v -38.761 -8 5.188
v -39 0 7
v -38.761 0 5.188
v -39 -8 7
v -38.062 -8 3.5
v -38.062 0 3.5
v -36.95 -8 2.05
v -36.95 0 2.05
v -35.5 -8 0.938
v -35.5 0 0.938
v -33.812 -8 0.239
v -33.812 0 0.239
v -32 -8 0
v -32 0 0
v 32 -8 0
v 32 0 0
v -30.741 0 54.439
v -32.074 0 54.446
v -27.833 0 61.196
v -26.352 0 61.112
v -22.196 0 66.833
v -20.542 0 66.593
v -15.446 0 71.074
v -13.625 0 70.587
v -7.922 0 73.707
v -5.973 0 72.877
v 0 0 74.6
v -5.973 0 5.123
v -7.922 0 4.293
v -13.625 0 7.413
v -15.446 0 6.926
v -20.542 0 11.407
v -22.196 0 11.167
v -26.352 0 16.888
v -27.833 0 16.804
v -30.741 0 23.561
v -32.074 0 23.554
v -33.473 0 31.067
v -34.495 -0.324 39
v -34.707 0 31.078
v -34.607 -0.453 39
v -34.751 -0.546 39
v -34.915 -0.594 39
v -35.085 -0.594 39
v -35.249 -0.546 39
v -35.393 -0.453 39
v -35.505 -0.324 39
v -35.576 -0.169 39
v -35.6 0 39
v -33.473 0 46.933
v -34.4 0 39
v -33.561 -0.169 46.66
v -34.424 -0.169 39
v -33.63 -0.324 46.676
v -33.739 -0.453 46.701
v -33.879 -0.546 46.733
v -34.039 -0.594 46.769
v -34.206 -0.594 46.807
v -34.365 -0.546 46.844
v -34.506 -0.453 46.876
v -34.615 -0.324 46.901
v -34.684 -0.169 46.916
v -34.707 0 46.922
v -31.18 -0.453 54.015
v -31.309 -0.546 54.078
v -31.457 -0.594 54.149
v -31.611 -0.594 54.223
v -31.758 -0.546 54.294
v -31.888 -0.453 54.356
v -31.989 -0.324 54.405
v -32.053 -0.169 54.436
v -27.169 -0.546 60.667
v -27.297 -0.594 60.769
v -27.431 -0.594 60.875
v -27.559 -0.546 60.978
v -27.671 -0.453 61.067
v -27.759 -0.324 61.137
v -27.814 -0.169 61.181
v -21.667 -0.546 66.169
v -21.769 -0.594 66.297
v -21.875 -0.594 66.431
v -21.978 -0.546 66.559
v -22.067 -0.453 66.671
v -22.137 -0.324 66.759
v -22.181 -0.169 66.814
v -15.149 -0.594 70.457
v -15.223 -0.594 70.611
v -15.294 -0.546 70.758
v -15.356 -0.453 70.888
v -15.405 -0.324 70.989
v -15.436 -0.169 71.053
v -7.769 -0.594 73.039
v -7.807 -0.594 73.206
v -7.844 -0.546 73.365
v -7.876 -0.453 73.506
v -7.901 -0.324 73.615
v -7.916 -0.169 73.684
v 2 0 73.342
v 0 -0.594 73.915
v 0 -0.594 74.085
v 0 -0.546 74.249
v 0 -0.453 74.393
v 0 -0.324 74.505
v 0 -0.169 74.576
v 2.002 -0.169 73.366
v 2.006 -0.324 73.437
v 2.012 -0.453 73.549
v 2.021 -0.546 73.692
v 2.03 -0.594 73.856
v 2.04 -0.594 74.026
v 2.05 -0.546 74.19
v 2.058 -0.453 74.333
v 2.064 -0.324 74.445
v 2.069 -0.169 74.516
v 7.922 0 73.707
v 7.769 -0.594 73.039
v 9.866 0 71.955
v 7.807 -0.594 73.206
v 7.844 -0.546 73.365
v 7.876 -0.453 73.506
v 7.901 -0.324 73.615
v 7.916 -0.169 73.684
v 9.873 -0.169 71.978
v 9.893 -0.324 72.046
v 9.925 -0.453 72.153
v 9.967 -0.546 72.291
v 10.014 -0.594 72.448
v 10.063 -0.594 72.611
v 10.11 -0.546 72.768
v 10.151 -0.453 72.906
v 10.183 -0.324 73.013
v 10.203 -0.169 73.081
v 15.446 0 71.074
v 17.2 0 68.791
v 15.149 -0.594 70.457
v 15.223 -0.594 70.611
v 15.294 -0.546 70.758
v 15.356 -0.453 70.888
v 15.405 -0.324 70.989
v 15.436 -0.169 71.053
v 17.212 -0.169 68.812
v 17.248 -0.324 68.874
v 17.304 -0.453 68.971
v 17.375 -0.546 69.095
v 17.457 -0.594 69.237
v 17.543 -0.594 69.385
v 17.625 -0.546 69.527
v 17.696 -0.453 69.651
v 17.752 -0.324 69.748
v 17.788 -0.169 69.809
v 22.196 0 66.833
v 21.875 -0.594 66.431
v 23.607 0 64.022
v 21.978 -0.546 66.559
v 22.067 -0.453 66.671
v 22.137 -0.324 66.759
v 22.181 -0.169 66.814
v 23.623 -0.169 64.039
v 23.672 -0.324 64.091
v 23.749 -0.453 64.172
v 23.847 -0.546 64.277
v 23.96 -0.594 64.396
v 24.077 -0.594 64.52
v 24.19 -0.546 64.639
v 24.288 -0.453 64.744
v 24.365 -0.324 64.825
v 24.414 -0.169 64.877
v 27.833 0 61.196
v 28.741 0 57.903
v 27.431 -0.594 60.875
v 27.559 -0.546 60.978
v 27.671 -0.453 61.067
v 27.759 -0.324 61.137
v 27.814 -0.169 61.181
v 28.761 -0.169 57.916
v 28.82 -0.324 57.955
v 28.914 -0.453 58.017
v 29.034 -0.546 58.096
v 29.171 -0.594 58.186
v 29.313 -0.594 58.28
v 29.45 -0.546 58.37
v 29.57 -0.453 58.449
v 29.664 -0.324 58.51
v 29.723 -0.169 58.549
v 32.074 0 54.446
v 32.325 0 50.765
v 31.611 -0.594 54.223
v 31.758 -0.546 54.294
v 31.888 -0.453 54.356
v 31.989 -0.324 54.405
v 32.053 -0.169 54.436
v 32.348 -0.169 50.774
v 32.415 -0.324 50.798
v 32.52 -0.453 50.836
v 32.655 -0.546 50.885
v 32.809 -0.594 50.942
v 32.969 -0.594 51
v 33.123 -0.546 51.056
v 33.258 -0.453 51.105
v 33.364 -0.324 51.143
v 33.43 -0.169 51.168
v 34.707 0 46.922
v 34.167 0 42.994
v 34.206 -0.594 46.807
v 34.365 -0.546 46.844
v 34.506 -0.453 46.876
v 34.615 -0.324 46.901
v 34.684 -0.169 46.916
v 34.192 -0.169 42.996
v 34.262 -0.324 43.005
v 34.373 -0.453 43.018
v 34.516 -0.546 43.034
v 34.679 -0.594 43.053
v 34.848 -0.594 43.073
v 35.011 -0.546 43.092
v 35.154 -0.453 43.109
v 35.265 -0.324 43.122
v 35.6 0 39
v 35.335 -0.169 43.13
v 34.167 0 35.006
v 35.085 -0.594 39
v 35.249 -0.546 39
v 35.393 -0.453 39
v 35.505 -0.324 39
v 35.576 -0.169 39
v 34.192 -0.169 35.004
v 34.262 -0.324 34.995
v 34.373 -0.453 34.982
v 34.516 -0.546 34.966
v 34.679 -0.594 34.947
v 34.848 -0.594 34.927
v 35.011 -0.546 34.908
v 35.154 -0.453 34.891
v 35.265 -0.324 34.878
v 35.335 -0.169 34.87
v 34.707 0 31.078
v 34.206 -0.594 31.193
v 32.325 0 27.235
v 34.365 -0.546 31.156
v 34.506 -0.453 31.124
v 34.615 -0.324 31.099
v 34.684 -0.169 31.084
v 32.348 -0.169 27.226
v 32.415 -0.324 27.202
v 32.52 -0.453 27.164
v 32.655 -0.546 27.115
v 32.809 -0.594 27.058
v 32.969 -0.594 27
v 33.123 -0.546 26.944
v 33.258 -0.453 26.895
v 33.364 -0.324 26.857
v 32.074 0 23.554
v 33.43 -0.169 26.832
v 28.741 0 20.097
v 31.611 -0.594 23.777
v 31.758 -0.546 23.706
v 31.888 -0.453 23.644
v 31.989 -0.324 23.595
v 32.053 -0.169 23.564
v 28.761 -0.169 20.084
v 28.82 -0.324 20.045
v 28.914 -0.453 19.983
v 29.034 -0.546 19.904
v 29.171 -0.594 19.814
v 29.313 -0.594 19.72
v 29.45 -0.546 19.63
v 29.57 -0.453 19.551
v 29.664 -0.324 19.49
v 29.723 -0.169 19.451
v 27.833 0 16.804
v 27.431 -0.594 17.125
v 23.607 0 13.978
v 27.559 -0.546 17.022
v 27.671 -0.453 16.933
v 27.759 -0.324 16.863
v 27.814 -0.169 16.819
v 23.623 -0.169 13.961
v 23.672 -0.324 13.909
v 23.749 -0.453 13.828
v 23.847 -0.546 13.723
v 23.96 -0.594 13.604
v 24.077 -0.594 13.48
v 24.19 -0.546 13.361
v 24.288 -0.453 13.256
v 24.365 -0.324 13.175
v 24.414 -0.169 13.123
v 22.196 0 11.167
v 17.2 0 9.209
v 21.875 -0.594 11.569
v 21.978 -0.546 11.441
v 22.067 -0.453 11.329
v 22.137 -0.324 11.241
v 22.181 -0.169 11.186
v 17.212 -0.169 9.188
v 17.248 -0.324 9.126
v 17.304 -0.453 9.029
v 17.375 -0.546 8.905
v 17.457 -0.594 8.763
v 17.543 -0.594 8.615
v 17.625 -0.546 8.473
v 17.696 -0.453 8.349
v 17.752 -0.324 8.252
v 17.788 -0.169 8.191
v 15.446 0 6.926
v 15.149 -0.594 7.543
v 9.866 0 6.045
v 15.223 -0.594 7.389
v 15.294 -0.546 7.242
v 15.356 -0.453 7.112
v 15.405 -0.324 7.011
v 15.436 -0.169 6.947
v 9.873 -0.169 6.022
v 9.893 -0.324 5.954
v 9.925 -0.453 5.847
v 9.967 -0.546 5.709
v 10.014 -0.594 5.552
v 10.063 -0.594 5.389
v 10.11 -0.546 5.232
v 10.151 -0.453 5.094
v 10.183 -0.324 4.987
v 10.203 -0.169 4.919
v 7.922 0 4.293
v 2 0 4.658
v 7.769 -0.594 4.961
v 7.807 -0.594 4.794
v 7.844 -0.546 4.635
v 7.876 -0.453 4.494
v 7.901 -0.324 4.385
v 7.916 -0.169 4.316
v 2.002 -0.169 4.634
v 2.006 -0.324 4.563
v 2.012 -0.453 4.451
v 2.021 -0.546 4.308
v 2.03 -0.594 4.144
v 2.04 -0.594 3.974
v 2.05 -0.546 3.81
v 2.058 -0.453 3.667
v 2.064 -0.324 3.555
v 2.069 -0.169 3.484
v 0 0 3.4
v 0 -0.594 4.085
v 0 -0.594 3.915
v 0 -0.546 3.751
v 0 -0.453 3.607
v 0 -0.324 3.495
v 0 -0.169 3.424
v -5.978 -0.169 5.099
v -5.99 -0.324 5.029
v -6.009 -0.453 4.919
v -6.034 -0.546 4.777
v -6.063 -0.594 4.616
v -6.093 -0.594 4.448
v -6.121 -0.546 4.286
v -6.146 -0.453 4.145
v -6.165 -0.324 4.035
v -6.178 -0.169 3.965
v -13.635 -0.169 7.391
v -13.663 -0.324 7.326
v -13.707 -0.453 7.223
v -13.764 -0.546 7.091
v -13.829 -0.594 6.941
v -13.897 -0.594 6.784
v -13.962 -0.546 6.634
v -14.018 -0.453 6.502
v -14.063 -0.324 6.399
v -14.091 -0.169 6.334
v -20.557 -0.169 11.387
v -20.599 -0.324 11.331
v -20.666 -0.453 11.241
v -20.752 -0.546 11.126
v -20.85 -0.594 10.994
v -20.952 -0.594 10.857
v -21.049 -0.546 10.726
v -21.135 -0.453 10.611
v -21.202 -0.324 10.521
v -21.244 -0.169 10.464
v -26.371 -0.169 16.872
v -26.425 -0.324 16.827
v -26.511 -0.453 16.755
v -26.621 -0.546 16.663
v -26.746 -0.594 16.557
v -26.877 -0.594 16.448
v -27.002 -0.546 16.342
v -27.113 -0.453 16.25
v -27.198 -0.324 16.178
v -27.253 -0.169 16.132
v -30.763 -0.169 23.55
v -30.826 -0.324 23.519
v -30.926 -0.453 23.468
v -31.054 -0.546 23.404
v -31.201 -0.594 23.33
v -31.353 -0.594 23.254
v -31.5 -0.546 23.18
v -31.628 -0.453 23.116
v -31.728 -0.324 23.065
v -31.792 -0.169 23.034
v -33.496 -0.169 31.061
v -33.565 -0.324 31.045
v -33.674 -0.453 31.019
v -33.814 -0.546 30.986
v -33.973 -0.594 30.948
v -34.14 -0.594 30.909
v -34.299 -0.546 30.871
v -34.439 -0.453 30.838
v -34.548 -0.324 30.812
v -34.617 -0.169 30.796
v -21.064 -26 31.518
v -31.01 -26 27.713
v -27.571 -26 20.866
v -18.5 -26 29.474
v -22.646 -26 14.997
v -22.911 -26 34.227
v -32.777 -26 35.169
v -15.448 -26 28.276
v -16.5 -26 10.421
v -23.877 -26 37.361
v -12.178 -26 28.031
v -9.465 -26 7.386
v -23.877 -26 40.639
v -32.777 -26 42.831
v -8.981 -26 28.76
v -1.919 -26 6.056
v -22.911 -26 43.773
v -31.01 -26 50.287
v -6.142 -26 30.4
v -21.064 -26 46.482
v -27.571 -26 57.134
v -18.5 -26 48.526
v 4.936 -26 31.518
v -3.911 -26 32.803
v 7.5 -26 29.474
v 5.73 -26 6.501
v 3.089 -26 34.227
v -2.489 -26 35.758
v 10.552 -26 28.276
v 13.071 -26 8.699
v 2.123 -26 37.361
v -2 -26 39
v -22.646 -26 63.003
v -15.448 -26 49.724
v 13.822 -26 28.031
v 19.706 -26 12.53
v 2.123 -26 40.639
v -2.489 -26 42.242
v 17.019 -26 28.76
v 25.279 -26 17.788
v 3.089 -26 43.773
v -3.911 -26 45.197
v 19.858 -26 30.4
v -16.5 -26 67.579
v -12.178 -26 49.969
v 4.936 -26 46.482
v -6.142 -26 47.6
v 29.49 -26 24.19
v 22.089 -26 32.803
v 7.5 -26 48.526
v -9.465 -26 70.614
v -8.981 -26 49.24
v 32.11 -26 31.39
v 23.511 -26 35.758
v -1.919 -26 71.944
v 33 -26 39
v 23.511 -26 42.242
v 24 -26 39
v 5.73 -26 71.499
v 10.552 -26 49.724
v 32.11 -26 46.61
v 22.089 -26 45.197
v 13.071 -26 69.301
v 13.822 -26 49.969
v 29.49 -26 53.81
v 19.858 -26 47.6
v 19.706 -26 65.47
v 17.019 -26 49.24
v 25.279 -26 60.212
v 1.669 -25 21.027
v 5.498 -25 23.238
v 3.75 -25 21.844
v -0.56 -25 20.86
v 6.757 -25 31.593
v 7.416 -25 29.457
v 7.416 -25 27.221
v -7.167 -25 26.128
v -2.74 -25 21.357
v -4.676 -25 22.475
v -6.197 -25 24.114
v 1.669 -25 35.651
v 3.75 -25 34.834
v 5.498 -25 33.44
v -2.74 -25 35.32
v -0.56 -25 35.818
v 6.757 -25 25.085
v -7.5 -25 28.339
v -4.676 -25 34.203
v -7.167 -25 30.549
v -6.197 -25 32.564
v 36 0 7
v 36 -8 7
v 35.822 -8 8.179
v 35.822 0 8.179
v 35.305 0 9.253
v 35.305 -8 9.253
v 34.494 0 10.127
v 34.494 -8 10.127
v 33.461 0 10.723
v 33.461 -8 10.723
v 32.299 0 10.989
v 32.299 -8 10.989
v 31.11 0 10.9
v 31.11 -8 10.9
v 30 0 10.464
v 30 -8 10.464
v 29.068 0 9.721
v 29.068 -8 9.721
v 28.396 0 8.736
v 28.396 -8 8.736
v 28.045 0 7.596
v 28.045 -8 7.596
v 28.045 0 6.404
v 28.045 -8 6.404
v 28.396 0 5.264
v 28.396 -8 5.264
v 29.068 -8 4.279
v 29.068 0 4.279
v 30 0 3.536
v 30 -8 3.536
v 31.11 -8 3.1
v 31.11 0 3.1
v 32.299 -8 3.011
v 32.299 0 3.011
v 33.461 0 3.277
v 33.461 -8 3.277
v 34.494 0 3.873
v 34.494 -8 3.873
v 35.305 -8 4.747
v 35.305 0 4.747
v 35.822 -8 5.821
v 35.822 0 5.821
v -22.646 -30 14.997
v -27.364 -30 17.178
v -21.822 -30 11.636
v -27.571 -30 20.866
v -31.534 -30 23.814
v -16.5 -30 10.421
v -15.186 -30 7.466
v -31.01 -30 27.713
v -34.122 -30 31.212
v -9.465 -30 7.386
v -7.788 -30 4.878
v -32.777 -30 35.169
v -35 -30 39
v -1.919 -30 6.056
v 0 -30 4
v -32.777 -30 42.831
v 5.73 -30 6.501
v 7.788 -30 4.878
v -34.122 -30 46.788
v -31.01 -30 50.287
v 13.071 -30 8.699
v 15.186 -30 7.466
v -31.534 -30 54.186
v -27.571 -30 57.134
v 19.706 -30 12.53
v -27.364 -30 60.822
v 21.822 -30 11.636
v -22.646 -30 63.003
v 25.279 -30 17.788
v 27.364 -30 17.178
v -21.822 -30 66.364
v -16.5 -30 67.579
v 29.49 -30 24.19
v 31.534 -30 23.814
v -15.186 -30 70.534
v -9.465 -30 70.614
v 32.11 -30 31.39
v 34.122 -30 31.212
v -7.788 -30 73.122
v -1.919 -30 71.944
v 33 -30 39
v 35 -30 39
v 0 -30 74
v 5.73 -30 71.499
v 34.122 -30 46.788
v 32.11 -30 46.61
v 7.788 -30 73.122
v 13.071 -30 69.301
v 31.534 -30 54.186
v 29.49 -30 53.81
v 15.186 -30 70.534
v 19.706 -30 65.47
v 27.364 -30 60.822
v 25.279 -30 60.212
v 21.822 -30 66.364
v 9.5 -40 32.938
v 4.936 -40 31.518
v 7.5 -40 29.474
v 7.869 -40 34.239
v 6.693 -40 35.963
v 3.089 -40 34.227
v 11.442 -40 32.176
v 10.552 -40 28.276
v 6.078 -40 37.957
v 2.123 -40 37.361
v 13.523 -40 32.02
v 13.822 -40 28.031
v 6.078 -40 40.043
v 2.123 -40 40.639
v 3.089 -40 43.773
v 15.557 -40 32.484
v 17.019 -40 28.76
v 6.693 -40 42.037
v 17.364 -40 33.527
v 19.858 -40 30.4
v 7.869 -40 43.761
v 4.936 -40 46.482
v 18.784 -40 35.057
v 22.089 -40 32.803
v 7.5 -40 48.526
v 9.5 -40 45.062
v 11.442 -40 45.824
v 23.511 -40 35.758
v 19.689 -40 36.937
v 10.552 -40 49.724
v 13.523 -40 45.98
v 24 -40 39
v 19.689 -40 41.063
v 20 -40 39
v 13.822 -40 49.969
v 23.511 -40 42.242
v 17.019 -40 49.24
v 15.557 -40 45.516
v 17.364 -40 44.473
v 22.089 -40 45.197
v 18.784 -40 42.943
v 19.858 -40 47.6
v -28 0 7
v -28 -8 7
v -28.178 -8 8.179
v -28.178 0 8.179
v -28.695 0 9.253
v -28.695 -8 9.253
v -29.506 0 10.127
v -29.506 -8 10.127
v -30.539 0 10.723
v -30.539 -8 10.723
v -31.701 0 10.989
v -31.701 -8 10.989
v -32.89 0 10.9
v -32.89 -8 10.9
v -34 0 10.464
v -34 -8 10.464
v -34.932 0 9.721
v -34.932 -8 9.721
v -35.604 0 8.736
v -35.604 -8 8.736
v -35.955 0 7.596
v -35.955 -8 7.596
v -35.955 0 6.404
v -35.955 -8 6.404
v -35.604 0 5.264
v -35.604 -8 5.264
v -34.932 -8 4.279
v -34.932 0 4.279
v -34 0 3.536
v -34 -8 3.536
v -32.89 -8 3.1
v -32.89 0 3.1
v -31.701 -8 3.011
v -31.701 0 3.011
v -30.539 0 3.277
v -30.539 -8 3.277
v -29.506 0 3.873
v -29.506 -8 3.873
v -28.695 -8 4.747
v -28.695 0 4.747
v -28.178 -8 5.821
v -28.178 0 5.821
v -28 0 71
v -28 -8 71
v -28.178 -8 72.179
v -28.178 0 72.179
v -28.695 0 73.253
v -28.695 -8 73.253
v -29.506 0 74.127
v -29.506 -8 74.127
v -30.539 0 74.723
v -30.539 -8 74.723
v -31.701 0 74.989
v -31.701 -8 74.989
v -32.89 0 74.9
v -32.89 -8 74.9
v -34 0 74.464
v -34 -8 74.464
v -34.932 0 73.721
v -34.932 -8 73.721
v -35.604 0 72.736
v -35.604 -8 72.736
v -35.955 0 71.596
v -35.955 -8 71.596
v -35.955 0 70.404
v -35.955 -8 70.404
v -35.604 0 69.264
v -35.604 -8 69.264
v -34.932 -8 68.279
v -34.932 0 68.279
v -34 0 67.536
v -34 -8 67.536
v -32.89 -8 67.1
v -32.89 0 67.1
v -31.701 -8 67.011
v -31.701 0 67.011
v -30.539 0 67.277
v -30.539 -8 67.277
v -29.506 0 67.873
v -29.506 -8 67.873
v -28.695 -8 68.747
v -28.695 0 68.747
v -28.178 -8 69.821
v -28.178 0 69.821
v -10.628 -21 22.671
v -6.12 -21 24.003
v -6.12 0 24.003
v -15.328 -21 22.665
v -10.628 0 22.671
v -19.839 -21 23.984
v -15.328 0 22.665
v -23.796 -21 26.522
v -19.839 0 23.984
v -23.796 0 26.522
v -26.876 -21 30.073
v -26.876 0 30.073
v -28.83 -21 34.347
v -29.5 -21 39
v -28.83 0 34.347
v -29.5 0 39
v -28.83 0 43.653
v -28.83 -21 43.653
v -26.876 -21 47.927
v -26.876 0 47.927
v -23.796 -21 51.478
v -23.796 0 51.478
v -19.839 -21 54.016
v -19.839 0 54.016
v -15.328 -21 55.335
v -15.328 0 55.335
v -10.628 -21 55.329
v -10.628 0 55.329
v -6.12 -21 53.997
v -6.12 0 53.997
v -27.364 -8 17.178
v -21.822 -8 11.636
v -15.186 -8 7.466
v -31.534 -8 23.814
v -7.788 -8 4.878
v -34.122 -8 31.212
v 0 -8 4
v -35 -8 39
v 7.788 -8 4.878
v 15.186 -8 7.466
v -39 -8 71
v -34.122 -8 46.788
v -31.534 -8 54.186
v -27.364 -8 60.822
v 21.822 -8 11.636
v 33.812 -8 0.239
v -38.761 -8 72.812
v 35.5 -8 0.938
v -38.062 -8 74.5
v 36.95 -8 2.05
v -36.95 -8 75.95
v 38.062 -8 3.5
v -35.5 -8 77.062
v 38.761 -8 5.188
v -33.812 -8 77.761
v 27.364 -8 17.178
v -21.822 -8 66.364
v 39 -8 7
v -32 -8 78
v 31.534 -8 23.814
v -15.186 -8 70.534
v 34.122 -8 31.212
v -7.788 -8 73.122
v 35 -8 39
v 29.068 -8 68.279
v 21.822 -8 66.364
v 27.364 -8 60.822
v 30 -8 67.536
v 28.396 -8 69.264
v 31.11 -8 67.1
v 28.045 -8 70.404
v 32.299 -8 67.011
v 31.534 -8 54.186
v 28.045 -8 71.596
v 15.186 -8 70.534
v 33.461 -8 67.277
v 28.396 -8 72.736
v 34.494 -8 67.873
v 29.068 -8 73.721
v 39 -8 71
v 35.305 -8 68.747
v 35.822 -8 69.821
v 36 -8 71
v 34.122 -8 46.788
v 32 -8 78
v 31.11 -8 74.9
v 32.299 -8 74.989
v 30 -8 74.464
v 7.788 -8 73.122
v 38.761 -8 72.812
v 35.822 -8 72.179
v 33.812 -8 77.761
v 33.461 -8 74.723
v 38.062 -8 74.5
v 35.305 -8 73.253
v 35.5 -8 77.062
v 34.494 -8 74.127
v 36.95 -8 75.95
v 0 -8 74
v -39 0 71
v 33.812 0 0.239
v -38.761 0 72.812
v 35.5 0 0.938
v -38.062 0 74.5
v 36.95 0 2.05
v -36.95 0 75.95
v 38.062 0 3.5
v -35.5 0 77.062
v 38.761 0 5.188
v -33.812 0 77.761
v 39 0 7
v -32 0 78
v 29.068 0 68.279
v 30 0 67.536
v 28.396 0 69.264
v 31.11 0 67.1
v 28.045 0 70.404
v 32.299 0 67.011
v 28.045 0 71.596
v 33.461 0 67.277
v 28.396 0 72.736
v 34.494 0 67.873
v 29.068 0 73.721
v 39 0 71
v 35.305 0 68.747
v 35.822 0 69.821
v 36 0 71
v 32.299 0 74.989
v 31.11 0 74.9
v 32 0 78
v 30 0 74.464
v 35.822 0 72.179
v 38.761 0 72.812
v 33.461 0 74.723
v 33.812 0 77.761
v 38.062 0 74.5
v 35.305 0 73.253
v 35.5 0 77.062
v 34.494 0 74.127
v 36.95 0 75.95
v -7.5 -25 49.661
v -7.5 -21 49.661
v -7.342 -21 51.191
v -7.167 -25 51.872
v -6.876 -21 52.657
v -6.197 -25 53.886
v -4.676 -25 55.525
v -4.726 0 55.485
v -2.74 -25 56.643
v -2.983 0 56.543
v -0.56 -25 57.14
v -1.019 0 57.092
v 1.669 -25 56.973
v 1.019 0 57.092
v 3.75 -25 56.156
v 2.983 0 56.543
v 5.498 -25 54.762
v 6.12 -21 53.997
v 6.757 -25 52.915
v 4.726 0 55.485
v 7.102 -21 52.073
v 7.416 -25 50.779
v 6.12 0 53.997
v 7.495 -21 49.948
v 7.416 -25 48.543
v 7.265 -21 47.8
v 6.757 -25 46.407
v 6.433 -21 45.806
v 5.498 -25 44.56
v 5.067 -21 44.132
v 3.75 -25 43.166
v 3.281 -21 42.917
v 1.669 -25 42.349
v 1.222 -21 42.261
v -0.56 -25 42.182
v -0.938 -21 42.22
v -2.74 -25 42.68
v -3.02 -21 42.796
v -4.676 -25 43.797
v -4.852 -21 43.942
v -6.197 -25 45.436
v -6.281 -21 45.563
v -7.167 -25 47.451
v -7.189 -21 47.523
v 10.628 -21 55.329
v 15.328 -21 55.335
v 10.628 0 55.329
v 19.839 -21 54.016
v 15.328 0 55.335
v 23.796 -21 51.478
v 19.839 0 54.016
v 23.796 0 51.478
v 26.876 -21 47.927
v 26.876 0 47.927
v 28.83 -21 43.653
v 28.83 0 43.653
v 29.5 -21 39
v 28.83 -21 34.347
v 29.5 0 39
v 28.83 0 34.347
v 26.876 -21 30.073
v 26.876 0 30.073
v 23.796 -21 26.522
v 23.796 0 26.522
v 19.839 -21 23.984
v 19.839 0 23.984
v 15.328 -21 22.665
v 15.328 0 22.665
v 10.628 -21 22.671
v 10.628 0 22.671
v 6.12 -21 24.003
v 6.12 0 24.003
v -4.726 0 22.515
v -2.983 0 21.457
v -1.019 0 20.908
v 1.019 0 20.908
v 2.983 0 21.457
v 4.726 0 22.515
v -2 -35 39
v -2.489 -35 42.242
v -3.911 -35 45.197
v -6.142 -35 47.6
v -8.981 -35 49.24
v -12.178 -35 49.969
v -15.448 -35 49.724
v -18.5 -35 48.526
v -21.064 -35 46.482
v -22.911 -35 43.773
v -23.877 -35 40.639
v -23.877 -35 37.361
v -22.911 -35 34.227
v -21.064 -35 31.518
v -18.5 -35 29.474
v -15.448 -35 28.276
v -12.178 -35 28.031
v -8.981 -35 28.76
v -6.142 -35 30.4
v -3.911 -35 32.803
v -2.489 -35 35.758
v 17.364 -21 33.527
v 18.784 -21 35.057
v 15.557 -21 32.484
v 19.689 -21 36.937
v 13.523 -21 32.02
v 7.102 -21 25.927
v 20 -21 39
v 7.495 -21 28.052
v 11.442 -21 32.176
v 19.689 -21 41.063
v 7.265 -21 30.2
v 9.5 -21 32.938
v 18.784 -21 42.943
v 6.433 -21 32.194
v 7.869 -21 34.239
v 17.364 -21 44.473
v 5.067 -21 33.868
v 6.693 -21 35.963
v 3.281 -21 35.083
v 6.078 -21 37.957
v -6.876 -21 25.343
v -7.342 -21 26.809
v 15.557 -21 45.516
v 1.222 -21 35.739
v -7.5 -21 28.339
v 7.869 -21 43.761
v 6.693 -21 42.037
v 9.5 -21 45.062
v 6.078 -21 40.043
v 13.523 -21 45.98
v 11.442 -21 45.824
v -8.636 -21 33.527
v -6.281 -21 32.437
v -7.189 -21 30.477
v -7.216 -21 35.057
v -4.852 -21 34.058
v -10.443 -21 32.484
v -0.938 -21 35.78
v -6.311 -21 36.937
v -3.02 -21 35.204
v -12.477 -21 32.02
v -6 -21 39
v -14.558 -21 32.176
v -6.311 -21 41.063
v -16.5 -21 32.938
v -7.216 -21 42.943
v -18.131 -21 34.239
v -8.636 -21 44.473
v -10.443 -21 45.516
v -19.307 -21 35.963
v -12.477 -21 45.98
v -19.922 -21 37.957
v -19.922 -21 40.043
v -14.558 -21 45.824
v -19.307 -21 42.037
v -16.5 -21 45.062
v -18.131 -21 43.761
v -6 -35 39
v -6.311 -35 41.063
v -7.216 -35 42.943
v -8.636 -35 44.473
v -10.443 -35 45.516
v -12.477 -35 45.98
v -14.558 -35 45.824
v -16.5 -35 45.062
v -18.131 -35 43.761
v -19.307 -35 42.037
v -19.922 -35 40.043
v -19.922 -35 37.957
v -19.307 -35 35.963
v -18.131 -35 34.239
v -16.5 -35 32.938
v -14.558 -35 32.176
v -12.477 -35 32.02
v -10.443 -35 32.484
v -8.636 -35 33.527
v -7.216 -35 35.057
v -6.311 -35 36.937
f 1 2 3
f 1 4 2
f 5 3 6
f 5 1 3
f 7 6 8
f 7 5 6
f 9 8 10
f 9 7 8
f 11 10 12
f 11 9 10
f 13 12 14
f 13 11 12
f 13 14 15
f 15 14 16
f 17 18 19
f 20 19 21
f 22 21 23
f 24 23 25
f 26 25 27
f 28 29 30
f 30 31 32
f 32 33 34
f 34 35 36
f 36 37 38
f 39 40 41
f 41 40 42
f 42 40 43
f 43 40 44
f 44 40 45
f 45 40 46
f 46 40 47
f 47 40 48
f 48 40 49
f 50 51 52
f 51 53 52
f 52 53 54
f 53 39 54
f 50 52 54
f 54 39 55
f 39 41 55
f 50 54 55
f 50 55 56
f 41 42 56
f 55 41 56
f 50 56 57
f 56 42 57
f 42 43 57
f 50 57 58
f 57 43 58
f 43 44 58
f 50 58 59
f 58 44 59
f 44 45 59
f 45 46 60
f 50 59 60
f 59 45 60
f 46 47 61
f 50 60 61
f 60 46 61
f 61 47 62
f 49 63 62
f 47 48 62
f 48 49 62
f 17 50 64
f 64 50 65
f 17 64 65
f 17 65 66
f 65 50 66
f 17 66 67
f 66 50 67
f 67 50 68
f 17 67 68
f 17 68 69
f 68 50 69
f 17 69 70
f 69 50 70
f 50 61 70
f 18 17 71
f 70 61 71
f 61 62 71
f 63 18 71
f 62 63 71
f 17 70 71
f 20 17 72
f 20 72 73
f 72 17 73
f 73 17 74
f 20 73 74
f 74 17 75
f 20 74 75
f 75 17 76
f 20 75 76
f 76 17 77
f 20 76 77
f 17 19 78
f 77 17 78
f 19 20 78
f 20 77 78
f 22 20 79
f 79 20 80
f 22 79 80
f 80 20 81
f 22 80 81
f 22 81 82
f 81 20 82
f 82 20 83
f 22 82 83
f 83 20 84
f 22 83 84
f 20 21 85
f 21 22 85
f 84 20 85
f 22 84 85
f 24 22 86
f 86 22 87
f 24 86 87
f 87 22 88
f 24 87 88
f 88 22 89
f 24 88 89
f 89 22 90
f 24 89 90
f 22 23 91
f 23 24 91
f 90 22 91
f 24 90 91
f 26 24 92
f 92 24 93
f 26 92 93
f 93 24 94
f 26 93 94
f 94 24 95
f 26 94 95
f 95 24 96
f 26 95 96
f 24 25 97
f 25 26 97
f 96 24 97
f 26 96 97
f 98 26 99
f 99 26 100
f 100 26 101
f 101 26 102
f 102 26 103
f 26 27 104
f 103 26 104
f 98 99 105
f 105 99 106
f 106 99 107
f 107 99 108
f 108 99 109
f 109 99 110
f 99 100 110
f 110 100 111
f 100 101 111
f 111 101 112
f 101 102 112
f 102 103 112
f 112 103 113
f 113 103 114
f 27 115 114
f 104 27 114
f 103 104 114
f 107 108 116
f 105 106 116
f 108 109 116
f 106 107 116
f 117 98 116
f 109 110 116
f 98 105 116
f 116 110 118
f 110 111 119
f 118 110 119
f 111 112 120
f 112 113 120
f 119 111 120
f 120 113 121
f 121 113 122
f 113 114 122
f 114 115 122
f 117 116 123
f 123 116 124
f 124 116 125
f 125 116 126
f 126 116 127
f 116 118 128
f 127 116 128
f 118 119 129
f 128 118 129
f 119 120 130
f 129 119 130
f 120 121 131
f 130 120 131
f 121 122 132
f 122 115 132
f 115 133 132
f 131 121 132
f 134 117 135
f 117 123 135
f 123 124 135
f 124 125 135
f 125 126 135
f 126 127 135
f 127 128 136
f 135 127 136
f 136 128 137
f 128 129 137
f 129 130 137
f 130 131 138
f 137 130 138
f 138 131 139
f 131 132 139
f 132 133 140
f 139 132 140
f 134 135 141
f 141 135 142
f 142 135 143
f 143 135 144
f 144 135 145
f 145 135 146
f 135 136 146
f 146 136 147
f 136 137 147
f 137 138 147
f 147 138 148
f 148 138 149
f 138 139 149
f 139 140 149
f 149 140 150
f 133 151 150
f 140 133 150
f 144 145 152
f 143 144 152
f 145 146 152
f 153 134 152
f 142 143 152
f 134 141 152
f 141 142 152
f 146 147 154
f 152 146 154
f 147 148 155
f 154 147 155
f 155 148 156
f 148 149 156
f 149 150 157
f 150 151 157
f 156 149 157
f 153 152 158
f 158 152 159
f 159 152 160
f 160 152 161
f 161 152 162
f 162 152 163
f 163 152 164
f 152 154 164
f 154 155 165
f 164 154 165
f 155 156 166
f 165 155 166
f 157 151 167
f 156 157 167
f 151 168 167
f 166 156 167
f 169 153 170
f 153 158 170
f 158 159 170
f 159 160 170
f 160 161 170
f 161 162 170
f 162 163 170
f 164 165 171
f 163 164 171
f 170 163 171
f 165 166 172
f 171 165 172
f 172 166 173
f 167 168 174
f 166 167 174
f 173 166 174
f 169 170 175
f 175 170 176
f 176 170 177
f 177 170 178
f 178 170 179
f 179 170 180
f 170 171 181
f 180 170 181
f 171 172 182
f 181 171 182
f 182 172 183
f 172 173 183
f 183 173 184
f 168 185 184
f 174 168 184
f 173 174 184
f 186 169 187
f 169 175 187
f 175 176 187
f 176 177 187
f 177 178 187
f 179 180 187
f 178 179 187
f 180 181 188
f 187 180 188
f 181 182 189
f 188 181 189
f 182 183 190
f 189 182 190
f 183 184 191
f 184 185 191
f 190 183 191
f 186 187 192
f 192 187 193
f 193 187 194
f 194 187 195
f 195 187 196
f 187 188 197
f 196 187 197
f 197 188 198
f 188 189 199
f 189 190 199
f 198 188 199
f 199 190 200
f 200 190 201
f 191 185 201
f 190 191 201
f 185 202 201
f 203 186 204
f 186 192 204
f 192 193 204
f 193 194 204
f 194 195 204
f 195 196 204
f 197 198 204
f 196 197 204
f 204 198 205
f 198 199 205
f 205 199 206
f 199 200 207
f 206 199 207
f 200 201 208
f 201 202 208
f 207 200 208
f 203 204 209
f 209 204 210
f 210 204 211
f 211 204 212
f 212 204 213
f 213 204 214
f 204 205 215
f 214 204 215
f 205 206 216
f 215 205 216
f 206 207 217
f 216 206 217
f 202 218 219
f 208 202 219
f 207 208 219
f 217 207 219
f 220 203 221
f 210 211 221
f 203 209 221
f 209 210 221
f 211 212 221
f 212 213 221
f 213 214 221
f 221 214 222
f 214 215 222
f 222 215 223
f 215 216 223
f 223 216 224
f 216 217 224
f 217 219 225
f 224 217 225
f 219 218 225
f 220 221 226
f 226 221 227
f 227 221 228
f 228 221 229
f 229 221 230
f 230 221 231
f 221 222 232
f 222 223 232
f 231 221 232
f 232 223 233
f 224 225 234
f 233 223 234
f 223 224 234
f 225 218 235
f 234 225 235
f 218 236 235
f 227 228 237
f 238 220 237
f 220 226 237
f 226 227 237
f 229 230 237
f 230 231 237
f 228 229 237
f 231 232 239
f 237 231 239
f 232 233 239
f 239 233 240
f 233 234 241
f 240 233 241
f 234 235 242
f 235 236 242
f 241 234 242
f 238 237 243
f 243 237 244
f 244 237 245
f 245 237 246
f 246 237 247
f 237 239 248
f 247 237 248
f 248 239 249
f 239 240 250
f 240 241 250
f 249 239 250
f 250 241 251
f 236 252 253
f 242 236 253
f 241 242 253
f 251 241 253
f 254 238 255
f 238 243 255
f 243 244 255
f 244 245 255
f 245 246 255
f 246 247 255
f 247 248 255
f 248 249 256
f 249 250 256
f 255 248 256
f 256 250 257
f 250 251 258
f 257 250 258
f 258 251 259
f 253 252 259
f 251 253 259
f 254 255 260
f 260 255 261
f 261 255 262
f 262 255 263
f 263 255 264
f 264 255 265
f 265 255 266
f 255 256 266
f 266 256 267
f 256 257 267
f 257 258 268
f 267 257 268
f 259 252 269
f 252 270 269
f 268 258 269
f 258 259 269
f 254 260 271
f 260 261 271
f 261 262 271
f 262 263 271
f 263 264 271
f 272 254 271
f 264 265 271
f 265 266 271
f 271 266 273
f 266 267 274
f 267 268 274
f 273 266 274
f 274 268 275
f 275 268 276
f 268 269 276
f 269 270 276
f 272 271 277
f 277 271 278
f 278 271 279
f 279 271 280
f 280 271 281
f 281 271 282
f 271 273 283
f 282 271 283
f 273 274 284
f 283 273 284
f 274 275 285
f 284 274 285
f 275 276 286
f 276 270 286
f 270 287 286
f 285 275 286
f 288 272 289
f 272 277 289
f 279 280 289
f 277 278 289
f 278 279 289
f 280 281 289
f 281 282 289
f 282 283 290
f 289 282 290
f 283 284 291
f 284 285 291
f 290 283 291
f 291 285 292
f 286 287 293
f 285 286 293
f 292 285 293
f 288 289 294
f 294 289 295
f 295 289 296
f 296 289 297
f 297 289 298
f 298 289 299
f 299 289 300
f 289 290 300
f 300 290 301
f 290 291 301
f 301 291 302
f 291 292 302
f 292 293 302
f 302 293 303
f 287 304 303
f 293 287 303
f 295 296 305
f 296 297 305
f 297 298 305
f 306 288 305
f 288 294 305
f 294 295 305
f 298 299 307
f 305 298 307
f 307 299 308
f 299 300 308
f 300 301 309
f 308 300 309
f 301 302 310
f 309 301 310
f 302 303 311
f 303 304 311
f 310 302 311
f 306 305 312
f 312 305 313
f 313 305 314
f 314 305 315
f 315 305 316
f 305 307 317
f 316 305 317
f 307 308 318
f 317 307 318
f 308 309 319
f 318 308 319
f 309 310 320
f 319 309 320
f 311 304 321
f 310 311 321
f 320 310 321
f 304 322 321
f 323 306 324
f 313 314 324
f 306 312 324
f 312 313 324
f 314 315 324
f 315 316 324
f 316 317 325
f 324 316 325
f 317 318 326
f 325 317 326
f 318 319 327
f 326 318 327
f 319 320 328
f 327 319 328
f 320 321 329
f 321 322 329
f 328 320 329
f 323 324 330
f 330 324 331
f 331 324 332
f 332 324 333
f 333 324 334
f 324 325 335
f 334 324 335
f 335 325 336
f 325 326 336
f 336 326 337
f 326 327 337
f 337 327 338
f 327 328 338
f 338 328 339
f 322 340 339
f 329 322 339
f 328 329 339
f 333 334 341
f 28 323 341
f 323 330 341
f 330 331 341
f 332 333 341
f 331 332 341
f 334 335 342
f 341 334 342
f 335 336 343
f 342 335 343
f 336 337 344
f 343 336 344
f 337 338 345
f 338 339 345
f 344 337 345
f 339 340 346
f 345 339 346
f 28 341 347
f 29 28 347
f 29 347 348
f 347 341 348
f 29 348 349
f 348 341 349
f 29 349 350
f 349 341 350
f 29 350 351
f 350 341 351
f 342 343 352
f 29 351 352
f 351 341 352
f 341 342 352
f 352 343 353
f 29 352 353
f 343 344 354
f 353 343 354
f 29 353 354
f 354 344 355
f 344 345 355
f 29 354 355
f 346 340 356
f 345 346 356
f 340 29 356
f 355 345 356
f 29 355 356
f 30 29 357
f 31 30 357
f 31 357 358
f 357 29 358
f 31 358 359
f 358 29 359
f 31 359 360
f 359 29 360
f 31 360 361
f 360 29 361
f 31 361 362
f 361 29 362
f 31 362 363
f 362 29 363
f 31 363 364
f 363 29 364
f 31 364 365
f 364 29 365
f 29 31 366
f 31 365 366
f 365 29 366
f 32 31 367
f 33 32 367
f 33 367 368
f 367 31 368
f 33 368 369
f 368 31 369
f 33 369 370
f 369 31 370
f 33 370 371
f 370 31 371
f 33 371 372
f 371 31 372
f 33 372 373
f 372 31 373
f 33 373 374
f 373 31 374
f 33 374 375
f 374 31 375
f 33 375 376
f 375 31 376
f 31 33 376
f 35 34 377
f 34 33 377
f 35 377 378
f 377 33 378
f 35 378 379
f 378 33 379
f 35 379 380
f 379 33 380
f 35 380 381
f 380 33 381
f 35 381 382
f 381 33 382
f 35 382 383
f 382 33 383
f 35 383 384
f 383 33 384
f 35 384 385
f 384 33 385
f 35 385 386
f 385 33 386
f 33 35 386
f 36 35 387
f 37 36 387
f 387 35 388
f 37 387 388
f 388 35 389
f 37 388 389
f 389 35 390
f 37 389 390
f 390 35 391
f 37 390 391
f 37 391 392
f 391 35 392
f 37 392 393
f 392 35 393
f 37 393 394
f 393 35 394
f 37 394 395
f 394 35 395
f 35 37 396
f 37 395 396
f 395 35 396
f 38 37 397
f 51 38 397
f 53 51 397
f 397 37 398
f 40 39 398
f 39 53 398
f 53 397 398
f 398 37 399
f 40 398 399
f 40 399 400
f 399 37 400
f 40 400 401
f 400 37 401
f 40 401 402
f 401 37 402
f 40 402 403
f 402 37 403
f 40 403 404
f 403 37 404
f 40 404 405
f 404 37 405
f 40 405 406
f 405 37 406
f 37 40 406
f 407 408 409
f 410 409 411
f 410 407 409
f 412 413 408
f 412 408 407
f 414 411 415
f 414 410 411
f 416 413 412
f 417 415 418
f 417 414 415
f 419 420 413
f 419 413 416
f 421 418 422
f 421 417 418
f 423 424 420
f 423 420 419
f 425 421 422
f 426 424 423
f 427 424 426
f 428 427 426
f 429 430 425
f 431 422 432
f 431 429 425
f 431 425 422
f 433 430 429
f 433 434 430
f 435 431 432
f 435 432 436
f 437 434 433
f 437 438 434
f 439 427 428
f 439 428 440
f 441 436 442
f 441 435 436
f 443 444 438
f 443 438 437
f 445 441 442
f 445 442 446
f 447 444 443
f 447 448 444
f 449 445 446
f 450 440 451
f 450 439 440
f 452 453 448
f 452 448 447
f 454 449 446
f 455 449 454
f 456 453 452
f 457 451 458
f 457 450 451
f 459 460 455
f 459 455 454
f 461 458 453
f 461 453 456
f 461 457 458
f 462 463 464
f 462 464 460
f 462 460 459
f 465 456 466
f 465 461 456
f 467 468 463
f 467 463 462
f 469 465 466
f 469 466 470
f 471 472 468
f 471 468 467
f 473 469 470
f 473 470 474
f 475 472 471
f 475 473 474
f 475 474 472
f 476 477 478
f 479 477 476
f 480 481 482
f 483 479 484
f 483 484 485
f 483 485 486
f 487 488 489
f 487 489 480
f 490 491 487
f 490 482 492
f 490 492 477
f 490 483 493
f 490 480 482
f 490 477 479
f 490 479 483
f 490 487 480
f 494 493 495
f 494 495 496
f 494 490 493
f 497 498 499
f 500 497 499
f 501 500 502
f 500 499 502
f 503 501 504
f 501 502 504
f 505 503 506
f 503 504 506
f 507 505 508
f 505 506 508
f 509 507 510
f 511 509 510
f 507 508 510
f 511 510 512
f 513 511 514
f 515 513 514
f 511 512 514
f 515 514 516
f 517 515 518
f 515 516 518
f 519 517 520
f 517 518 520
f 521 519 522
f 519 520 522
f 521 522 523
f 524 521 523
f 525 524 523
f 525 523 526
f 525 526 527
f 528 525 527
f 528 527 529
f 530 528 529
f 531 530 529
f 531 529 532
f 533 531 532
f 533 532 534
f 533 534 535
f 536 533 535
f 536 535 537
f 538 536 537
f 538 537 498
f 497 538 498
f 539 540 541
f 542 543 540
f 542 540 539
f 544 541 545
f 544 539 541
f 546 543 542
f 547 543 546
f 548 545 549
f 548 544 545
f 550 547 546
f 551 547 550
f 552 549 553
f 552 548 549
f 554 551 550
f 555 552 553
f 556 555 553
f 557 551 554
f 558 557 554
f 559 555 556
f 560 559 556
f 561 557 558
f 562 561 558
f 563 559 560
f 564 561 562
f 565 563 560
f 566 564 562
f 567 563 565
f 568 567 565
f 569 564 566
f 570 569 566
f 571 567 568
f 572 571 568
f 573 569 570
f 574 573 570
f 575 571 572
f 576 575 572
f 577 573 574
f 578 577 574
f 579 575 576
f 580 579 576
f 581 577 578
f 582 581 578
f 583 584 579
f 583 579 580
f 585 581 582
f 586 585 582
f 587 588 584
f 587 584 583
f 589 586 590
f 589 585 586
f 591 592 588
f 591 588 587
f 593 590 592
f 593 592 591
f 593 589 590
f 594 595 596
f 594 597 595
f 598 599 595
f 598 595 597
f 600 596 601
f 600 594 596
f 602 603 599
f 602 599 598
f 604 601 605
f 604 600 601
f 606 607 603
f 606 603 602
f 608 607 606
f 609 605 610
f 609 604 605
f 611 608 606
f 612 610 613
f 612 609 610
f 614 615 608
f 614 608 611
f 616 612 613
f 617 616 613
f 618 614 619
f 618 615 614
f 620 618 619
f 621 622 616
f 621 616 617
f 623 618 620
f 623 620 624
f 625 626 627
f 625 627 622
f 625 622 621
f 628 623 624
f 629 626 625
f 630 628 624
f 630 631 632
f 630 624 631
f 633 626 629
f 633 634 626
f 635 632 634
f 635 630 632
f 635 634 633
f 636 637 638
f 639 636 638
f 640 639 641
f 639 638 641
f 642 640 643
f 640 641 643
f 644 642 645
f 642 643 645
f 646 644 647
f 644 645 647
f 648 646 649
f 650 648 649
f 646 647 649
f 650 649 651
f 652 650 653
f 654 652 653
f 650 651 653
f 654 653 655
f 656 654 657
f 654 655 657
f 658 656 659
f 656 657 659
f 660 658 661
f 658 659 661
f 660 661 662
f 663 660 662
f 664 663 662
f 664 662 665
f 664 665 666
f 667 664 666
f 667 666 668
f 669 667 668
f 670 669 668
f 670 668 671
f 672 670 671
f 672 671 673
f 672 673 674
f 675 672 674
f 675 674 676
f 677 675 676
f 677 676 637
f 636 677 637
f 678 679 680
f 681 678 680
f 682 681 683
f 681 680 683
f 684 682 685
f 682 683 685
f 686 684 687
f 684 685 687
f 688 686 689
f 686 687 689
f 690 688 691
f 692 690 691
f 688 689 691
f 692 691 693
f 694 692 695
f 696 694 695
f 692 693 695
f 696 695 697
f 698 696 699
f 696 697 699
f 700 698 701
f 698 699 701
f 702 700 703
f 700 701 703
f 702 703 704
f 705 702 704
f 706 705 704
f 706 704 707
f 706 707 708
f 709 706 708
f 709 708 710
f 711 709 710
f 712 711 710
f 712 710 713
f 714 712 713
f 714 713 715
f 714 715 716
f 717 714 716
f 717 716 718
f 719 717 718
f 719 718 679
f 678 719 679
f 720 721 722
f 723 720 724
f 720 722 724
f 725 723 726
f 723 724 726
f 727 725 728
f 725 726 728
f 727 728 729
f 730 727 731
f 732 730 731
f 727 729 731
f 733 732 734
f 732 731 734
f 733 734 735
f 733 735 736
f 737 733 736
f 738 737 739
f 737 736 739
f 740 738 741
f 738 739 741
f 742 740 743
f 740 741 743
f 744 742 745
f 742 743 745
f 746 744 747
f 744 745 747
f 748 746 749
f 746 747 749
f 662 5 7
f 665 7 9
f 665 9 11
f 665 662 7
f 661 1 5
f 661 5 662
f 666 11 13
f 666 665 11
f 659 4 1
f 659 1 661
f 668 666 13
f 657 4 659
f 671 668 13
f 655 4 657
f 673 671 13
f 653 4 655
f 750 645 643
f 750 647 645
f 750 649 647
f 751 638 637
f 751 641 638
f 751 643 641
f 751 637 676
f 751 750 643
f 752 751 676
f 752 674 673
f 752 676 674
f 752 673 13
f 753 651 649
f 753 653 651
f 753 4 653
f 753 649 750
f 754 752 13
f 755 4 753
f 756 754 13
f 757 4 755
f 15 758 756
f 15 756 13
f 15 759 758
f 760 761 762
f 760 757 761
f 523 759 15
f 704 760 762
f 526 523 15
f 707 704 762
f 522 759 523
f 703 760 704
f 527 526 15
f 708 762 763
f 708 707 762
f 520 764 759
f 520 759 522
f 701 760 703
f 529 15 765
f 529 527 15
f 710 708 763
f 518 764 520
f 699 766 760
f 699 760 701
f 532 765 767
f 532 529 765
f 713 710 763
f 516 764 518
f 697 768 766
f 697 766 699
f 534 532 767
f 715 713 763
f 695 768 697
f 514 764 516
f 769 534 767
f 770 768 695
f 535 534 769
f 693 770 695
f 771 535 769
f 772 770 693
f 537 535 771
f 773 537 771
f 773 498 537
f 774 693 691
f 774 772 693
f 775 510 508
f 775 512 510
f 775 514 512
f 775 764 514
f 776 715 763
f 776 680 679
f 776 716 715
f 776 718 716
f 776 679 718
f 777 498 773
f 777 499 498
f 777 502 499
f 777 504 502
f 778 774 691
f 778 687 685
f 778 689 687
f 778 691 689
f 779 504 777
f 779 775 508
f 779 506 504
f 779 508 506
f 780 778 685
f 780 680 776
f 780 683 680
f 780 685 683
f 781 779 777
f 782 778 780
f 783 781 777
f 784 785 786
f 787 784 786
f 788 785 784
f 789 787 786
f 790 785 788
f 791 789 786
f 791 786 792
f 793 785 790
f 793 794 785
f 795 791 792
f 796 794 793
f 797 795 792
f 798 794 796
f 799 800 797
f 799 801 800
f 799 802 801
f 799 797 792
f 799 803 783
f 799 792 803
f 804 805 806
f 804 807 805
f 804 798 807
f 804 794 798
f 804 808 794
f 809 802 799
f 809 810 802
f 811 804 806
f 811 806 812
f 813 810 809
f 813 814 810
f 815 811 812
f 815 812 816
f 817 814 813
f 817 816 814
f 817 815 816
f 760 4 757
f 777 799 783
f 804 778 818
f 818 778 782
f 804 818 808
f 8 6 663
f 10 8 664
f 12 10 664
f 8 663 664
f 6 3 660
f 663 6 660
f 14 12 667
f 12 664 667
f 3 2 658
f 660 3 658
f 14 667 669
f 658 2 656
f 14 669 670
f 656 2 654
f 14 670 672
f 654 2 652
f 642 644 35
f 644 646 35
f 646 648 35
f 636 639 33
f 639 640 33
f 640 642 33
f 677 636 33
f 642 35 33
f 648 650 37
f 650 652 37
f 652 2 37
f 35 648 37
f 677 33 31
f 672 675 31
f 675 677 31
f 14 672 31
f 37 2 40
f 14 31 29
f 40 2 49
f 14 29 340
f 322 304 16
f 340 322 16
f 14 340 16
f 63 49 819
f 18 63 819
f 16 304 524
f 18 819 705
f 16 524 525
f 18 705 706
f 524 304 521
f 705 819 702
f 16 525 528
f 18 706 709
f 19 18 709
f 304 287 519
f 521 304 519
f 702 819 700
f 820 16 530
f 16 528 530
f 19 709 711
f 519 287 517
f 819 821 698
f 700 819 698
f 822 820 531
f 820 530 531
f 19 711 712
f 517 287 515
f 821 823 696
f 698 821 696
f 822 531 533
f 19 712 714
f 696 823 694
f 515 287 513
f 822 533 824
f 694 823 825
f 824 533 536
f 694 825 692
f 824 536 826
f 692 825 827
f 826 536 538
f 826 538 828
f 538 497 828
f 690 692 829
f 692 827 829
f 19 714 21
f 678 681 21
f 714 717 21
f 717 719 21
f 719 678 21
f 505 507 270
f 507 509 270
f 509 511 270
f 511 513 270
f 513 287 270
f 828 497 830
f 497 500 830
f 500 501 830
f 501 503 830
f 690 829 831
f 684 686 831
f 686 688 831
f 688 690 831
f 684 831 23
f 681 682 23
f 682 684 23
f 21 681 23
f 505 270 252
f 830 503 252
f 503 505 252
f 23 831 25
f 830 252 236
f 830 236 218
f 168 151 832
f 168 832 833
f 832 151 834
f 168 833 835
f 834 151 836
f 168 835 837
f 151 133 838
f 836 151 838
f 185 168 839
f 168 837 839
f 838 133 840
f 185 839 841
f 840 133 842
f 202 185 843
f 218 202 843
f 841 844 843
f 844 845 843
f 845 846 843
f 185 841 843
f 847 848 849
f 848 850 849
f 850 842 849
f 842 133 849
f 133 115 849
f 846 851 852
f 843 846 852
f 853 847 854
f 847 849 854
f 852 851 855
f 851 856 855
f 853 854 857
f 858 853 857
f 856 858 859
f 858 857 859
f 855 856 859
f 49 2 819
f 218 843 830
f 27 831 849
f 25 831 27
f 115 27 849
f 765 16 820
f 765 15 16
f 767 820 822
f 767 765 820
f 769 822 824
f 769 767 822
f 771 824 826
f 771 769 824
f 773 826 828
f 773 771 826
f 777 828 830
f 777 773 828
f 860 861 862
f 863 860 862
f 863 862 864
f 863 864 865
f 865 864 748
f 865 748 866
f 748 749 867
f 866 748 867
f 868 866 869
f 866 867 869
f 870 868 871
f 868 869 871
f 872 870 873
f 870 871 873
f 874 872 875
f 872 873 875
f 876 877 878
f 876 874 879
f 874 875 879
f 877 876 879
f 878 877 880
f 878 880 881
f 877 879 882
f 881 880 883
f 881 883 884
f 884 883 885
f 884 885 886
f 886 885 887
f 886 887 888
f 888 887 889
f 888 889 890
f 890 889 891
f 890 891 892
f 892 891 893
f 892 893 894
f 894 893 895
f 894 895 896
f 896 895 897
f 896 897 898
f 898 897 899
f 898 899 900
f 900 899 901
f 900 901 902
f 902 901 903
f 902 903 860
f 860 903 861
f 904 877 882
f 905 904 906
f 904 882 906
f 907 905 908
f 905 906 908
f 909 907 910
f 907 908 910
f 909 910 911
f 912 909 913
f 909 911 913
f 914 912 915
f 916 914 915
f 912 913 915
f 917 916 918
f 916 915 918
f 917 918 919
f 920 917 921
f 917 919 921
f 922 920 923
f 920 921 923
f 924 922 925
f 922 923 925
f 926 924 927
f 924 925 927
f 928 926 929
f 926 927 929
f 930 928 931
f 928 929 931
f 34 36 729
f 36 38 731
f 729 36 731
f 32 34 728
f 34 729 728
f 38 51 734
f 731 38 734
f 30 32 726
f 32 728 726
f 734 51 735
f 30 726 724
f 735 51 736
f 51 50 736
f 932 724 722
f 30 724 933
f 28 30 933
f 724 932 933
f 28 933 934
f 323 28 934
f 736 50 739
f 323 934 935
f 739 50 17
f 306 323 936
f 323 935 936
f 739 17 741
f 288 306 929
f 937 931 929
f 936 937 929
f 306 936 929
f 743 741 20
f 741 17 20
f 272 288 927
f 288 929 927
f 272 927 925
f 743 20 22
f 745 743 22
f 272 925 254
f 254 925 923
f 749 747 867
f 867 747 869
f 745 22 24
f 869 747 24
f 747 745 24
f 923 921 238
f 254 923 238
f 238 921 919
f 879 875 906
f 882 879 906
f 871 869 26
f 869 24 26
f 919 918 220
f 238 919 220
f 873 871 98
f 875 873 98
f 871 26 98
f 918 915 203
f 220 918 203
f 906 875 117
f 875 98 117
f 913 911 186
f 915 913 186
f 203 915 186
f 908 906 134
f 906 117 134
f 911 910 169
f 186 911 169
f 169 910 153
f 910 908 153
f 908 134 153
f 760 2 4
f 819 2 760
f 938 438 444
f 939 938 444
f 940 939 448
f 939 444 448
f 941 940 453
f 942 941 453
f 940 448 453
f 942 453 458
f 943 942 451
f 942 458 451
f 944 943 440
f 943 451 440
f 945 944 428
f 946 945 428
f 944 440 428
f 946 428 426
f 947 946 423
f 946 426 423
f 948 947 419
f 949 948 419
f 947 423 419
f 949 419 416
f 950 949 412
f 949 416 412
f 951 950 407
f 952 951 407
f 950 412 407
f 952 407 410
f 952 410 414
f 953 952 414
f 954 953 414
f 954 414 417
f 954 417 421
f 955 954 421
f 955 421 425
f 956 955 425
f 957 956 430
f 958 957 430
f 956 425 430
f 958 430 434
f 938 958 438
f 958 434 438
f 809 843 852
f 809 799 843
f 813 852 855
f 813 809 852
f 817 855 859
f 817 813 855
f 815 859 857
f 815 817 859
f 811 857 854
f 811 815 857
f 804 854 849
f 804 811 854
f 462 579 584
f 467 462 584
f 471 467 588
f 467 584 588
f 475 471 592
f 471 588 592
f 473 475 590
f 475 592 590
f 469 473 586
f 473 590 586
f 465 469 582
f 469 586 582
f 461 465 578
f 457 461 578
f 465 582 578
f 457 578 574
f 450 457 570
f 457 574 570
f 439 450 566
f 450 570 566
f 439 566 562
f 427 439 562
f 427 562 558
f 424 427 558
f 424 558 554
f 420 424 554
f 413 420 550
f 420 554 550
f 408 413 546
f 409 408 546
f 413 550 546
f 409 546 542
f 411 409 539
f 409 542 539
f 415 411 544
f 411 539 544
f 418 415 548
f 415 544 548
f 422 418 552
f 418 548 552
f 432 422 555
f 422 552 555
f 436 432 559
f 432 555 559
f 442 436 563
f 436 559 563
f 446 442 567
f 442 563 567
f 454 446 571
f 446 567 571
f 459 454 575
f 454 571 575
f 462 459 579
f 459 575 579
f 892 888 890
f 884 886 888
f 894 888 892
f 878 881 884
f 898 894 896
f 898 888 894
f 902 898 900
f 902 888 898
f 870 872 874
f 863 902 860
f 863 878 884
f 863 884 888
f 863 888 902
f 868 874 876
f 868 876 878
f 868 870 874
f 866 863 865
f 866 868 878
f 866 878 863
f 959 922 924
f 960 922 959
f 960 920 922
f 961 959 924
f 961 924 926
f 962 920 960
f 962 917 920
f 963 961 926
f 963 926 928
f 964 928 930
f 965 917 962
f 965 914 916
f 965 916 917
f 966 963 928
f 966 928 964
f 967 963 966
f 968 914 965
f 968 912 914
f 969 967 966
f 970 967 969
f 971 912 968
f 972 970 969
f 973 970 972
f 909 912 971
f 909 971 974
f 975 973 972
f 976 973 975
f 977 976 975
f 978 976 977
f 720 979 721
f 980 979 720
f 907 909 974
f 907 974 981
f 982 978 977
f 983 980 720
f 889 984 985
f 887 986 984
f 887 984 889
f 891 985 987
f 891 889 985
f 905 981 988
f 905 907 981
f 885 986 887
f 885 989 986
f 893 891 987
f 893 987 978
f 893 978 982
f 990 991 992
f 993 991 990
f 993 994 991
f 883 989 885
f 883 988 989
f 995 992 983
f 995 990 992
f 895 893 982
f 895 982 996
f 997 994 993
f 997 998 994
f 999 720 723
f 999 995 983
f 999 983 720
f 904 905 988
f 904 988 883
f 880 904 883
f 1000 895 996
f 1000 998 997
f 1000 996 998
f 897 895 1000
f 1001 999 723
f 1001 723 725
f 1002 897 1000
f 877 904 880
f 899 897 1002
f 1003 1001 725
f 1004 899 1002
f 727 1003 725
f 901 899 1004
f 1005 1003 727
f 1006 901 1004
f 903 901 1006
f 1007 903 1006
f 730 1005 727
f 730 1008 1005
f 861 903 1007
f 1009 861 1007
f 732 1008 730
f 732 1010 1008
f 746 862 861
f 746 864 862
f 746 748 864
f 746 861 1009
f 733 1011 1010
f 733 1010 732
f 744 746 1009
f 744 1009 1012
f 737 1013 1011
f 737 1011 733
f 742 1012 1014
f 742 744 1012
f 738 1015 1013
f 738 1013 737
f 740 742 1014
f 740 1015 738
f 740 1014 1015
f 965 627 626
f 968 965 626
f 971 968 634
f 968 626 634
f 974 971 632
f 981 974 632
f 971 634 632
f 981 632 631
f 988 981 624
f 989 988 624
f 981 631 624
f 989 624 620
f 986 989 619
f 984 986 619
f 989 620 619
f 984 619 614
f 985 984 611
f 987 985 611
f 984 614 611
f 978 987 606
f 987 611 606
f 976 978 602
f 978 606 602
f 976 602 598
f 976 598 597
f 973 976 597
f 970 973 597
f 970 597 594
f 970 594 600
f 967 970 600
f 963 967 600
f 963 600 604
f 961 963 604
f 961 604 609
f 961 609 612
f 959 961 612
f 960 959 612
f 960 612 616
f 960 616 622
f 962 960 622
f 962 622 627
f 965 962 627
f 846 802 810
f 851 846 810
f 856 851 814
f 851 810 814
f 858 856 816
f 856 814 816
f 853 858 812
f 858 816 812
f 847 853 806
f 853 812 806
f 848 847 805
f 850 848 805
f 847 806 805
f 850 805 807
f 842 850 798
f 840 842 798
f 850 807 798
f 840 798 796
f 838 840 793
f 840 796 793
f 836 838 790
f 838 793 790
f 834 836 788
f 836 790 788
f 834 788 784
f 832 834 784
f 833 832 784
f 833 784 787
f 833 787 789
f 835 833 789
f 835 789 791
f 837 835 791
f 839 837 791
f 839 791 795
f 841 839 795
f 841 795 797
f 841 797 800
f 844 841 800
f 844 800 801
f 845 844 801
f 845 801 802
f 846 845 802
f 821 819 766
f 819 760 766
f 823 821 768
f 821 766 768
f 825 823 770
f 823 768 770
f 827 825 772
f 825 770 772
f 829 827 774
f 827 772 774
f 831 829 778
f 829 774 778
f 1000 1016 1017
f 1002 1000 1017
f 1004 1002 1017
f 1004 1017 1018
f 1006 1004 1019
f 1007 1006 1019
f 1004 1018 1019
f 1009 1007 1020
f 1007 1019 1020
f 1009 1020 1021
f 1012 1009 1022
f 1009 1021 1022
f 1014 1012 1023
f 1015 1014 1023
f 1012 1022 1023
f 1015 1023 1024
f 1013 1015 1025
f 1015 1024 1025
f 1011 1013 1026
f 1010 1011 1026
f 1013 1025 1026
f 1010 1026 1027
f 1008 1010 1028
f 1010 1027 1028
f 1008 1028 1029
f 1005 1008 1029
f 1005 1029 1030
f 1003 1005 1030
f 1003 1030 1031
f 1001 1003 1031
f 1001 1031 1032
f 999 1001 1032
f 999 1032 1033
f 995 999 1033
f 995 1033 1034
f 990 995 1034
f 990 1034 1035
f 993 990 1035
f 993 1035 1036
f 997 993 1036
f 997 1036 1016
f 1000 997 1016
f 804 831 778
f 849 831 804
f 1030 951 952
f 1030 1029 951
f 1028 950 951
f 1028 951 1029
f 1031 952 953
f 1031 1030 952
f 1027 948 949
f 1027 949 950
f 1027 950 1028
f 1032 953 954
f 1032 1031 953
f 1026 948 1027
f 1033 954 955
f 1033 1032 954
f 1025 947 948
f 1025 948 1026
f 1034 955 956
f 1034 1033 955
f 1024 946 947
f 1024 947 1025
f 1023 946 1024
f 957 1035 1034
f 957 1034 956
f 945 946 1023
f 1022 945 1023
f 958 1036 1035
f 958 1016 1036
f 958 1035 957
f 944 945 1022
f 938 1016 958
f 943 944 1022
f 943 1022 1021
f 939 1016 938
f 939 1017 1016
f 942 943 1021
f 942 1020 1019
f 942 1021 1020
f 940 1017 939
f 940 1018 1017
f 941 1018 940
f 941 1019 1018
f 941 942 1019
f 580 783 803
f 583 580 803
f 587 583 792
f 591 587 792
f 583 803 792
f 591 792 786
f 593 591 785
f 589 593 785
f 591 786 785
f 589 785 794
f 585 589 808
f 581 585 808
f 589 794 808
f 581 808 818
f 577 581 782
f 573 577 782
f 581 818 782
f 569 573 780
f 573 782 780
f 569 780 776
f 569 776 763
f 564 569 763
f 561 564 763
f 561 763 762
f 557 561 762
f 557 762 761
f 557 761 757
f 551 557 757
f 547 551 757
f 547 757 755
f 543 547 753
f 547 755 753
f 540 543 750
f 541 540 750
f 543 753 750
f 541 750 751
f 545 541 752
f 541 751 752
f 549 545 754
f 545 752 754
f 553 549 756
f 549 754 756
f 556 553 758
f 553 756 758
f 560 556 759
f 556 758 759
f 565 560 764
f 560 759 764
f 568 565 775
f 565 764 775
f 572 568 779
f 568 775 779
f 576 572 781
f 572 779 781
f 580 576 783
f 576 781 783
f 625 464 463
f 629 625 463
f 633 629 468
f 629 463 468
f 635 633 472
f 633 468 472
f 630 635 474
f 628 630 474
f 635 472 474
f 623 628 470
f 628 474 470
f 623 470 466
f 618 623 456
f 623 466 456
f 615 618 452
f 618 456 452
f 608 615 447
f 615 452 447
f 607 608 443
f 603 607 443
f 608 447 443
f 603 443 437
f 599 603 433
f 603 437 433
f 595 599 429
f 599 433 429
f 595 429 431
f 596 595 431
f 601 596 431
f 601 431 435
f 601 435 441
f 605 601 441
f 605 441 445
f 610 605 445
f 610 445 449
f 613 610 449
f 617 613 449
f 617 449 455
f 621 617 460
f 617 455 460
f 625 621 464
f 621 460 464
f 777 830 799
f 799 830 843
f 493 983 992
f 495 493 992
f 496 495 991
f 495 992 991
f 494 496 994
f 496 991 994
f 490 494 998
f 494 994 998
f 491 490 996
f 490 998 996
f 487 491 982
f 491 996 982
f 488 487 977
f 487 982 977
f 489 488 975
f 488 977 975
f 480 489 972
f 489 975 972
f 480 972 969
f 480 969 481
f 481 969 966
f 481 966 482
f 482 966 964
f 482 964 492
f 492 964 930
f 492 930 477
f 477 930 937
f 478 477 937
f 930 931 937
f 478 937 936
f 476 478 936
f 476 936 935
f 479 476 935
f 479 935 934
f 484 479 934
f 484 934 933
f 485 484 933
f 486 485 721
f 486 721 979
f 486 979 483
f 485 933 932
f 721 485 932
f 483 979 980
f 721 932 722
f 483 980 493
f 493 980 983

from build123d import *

# Parameters (mm, degrees)
F0_W      = 78
F0_H      = 78
F1_DEPTH  = 8
F2_R      = 7
F3_R      = 4
F4_DEPTH  = 8.001
F5_R      = 35
F6_DEPTH  = 22
F7_R      = 33
F8_DEPTH  = 4
F10_R     = 0.6
F13_DEPTH = 21
F14_R     = 7.5
F15_DEPTH = 25
F16_R     = 11
F17_DEPTH = 14
F18_R     = 11
F19_DEPTH = 9
F20_R     = 7
F21_DEPTH = 35.001
F22_R     = 7
F23_DEPTH = 40.001


with BuildPart() as f1:
    # F0 (on Front) → F1 (new body)
    with BuildSketch(Plane.XZ):
        with Locations((0, 39)):
            Rectangle(F0_W, F0_H)
    extrude(amount=F1_DEPTH)

    # F2
    f2_edges = [f1.edges().sort_by_distance(p)[0] for p in [
        (-39, -4, 78),
        (39, -4, 78),
        (39, -4, 0),
        (-39, -4, 0),
    ]]
    fillet(f2_edges, radius=F2_R)

    # F3 (on face) → F4 (cut, through all)
    with BuildSketch(Plane.XZ.offset(8)):
        with Locations((-32, 71)):
            Circle(F3_R)
        with Locations((32, 71)):
            Circle(F3_R)
        with Locations((-32, 7)):
            Circle(F3_R)
        with Locations((32, 7)):
            Circle(F3_R)
    extrude(amount=-F4_DEPTH, mode=Mode.SUBTRACT)

    # F5 (on face) → F6 (join)
    with BuildSketch(Plane.XZ.offset(8)):
        with Locations((0, 39)):
            Circle(F5_R)
    extrude(amount=F6_DEPTH)

    # F7 (on face) → F8 (cut)
    with BuildSketch(Plane.XZ.offset(30)):
        with Locations((0, 39)):
            Circle(F7_R)
    extrude(amount=-F8_DEPTH, mode=Mode.SUBTRACT)

    # F11: sweep along a path in F9
    with BuildLine(Plane(origin=(0, 0, 0), x_dir=(-1, 0, 0), z_dir=(0, 1, 0))) as f11_path:
        CenterArc((0, 39), 35, 0, 360)
    # F10 (on Right) → F11 (sweep, cut)
    with BuildSketch(Plane.YZ):
        with Locations((0, 74)):
            Circle(F10_R)
    sweep(path=f11_path.line, mode=Mode.SUBTRACT)

    # F12 (on face) → F13 (cut)
    with BuildSketch(Plane(origin=(0, 0, 0), x_dir=(-1, 0, 0), z_dir=(0, 1, 0))):
        with BuildLine():
            ThreePointArc((0, 28.8387992835), (18.3735463151, 23.3995192382), (29.5, 39))
            ThreePointArc((29.5, 39), (18.3735463151, 54.6004807618), (0, 49.1612007165))
            ThreePointArc((0, 49.1612007165), (2.6004807618, 44.3735463151), (3.5, 39))
            ThreePointArc((3.5, 39), (2.6004807618, 33.6264536849), (0, 28.8387992835))
        make_face()
        with BuildLine():
            ThreePointArc((3.5, 39), (2.6004807618, 44.3735463151), (0, 49.1612007165))
            ThreePointArc((0, 49.1612007165), (-3.5, 39), (0, 28.8387992835))
            ThreePointArc((0, 28.8387992835), (2.6004807618, 33.6264536849), (3.5, 39))
        make_face()
        with BuildLine():
            ThreePointArc((0, 28.8387992835), (-3.5, 39), (0, 49.1612007165))
            ThreePointArc((0, 49.1612007165), (-29.5, 39), (0, 28.8387992835))
        make_face()
    extrude(amount=-F13_DEPTH, mode=Mode.SUBTRACT)

    # F14 (on face) → F15 (cut)
    with BuildSketch(Plane(origin=(0, 0, 0), x_dir=(-1, 0, 0), z_dir=(0, 1, 0))):
        with Locations((0, 28.3387992835)):
            Circle(F14_R)
        with Locations((0, 49.6612007165)):
            Circle(F14_R)
    extrude(amount=-F15_DEPTH, mode=Mode.SUBTRACT)

    # F16 (on face) → F17 (join)
    with BuildSketch(Plane.XZ.offset(26)):
        with Locations((13, 39)):
            Circle(F16_R)
    extrude(amount=F17_DEPTH)

    # F18 (on face) → F19 (join)
    with BuildSketch(Plane.XZ.offset(26)):
        with Locations((-13, 39)):
            Circle(F18_R)
    extrude(amount=F19_DEPTH)

    # F20 (on face) → F21 (cut, through all)
    with BuildSketch(Plane.XZ.offset(35)):
        with Locations((-13, 39)):
            Circle(F20_R)
    extrude(amount=-F21_DEPTH, mode=Mode.SUBTRACT)

    # F22 (on face) → F23 (cut, through all)
    with BuildSketch(Plane.XZ.offset(40)):
        with Locations((13, 39)):
            Circle(F22_R)
    extrude(amount=-F23_DEPTH, mode=Mode.SUBTRACT)


solid = f1.part
